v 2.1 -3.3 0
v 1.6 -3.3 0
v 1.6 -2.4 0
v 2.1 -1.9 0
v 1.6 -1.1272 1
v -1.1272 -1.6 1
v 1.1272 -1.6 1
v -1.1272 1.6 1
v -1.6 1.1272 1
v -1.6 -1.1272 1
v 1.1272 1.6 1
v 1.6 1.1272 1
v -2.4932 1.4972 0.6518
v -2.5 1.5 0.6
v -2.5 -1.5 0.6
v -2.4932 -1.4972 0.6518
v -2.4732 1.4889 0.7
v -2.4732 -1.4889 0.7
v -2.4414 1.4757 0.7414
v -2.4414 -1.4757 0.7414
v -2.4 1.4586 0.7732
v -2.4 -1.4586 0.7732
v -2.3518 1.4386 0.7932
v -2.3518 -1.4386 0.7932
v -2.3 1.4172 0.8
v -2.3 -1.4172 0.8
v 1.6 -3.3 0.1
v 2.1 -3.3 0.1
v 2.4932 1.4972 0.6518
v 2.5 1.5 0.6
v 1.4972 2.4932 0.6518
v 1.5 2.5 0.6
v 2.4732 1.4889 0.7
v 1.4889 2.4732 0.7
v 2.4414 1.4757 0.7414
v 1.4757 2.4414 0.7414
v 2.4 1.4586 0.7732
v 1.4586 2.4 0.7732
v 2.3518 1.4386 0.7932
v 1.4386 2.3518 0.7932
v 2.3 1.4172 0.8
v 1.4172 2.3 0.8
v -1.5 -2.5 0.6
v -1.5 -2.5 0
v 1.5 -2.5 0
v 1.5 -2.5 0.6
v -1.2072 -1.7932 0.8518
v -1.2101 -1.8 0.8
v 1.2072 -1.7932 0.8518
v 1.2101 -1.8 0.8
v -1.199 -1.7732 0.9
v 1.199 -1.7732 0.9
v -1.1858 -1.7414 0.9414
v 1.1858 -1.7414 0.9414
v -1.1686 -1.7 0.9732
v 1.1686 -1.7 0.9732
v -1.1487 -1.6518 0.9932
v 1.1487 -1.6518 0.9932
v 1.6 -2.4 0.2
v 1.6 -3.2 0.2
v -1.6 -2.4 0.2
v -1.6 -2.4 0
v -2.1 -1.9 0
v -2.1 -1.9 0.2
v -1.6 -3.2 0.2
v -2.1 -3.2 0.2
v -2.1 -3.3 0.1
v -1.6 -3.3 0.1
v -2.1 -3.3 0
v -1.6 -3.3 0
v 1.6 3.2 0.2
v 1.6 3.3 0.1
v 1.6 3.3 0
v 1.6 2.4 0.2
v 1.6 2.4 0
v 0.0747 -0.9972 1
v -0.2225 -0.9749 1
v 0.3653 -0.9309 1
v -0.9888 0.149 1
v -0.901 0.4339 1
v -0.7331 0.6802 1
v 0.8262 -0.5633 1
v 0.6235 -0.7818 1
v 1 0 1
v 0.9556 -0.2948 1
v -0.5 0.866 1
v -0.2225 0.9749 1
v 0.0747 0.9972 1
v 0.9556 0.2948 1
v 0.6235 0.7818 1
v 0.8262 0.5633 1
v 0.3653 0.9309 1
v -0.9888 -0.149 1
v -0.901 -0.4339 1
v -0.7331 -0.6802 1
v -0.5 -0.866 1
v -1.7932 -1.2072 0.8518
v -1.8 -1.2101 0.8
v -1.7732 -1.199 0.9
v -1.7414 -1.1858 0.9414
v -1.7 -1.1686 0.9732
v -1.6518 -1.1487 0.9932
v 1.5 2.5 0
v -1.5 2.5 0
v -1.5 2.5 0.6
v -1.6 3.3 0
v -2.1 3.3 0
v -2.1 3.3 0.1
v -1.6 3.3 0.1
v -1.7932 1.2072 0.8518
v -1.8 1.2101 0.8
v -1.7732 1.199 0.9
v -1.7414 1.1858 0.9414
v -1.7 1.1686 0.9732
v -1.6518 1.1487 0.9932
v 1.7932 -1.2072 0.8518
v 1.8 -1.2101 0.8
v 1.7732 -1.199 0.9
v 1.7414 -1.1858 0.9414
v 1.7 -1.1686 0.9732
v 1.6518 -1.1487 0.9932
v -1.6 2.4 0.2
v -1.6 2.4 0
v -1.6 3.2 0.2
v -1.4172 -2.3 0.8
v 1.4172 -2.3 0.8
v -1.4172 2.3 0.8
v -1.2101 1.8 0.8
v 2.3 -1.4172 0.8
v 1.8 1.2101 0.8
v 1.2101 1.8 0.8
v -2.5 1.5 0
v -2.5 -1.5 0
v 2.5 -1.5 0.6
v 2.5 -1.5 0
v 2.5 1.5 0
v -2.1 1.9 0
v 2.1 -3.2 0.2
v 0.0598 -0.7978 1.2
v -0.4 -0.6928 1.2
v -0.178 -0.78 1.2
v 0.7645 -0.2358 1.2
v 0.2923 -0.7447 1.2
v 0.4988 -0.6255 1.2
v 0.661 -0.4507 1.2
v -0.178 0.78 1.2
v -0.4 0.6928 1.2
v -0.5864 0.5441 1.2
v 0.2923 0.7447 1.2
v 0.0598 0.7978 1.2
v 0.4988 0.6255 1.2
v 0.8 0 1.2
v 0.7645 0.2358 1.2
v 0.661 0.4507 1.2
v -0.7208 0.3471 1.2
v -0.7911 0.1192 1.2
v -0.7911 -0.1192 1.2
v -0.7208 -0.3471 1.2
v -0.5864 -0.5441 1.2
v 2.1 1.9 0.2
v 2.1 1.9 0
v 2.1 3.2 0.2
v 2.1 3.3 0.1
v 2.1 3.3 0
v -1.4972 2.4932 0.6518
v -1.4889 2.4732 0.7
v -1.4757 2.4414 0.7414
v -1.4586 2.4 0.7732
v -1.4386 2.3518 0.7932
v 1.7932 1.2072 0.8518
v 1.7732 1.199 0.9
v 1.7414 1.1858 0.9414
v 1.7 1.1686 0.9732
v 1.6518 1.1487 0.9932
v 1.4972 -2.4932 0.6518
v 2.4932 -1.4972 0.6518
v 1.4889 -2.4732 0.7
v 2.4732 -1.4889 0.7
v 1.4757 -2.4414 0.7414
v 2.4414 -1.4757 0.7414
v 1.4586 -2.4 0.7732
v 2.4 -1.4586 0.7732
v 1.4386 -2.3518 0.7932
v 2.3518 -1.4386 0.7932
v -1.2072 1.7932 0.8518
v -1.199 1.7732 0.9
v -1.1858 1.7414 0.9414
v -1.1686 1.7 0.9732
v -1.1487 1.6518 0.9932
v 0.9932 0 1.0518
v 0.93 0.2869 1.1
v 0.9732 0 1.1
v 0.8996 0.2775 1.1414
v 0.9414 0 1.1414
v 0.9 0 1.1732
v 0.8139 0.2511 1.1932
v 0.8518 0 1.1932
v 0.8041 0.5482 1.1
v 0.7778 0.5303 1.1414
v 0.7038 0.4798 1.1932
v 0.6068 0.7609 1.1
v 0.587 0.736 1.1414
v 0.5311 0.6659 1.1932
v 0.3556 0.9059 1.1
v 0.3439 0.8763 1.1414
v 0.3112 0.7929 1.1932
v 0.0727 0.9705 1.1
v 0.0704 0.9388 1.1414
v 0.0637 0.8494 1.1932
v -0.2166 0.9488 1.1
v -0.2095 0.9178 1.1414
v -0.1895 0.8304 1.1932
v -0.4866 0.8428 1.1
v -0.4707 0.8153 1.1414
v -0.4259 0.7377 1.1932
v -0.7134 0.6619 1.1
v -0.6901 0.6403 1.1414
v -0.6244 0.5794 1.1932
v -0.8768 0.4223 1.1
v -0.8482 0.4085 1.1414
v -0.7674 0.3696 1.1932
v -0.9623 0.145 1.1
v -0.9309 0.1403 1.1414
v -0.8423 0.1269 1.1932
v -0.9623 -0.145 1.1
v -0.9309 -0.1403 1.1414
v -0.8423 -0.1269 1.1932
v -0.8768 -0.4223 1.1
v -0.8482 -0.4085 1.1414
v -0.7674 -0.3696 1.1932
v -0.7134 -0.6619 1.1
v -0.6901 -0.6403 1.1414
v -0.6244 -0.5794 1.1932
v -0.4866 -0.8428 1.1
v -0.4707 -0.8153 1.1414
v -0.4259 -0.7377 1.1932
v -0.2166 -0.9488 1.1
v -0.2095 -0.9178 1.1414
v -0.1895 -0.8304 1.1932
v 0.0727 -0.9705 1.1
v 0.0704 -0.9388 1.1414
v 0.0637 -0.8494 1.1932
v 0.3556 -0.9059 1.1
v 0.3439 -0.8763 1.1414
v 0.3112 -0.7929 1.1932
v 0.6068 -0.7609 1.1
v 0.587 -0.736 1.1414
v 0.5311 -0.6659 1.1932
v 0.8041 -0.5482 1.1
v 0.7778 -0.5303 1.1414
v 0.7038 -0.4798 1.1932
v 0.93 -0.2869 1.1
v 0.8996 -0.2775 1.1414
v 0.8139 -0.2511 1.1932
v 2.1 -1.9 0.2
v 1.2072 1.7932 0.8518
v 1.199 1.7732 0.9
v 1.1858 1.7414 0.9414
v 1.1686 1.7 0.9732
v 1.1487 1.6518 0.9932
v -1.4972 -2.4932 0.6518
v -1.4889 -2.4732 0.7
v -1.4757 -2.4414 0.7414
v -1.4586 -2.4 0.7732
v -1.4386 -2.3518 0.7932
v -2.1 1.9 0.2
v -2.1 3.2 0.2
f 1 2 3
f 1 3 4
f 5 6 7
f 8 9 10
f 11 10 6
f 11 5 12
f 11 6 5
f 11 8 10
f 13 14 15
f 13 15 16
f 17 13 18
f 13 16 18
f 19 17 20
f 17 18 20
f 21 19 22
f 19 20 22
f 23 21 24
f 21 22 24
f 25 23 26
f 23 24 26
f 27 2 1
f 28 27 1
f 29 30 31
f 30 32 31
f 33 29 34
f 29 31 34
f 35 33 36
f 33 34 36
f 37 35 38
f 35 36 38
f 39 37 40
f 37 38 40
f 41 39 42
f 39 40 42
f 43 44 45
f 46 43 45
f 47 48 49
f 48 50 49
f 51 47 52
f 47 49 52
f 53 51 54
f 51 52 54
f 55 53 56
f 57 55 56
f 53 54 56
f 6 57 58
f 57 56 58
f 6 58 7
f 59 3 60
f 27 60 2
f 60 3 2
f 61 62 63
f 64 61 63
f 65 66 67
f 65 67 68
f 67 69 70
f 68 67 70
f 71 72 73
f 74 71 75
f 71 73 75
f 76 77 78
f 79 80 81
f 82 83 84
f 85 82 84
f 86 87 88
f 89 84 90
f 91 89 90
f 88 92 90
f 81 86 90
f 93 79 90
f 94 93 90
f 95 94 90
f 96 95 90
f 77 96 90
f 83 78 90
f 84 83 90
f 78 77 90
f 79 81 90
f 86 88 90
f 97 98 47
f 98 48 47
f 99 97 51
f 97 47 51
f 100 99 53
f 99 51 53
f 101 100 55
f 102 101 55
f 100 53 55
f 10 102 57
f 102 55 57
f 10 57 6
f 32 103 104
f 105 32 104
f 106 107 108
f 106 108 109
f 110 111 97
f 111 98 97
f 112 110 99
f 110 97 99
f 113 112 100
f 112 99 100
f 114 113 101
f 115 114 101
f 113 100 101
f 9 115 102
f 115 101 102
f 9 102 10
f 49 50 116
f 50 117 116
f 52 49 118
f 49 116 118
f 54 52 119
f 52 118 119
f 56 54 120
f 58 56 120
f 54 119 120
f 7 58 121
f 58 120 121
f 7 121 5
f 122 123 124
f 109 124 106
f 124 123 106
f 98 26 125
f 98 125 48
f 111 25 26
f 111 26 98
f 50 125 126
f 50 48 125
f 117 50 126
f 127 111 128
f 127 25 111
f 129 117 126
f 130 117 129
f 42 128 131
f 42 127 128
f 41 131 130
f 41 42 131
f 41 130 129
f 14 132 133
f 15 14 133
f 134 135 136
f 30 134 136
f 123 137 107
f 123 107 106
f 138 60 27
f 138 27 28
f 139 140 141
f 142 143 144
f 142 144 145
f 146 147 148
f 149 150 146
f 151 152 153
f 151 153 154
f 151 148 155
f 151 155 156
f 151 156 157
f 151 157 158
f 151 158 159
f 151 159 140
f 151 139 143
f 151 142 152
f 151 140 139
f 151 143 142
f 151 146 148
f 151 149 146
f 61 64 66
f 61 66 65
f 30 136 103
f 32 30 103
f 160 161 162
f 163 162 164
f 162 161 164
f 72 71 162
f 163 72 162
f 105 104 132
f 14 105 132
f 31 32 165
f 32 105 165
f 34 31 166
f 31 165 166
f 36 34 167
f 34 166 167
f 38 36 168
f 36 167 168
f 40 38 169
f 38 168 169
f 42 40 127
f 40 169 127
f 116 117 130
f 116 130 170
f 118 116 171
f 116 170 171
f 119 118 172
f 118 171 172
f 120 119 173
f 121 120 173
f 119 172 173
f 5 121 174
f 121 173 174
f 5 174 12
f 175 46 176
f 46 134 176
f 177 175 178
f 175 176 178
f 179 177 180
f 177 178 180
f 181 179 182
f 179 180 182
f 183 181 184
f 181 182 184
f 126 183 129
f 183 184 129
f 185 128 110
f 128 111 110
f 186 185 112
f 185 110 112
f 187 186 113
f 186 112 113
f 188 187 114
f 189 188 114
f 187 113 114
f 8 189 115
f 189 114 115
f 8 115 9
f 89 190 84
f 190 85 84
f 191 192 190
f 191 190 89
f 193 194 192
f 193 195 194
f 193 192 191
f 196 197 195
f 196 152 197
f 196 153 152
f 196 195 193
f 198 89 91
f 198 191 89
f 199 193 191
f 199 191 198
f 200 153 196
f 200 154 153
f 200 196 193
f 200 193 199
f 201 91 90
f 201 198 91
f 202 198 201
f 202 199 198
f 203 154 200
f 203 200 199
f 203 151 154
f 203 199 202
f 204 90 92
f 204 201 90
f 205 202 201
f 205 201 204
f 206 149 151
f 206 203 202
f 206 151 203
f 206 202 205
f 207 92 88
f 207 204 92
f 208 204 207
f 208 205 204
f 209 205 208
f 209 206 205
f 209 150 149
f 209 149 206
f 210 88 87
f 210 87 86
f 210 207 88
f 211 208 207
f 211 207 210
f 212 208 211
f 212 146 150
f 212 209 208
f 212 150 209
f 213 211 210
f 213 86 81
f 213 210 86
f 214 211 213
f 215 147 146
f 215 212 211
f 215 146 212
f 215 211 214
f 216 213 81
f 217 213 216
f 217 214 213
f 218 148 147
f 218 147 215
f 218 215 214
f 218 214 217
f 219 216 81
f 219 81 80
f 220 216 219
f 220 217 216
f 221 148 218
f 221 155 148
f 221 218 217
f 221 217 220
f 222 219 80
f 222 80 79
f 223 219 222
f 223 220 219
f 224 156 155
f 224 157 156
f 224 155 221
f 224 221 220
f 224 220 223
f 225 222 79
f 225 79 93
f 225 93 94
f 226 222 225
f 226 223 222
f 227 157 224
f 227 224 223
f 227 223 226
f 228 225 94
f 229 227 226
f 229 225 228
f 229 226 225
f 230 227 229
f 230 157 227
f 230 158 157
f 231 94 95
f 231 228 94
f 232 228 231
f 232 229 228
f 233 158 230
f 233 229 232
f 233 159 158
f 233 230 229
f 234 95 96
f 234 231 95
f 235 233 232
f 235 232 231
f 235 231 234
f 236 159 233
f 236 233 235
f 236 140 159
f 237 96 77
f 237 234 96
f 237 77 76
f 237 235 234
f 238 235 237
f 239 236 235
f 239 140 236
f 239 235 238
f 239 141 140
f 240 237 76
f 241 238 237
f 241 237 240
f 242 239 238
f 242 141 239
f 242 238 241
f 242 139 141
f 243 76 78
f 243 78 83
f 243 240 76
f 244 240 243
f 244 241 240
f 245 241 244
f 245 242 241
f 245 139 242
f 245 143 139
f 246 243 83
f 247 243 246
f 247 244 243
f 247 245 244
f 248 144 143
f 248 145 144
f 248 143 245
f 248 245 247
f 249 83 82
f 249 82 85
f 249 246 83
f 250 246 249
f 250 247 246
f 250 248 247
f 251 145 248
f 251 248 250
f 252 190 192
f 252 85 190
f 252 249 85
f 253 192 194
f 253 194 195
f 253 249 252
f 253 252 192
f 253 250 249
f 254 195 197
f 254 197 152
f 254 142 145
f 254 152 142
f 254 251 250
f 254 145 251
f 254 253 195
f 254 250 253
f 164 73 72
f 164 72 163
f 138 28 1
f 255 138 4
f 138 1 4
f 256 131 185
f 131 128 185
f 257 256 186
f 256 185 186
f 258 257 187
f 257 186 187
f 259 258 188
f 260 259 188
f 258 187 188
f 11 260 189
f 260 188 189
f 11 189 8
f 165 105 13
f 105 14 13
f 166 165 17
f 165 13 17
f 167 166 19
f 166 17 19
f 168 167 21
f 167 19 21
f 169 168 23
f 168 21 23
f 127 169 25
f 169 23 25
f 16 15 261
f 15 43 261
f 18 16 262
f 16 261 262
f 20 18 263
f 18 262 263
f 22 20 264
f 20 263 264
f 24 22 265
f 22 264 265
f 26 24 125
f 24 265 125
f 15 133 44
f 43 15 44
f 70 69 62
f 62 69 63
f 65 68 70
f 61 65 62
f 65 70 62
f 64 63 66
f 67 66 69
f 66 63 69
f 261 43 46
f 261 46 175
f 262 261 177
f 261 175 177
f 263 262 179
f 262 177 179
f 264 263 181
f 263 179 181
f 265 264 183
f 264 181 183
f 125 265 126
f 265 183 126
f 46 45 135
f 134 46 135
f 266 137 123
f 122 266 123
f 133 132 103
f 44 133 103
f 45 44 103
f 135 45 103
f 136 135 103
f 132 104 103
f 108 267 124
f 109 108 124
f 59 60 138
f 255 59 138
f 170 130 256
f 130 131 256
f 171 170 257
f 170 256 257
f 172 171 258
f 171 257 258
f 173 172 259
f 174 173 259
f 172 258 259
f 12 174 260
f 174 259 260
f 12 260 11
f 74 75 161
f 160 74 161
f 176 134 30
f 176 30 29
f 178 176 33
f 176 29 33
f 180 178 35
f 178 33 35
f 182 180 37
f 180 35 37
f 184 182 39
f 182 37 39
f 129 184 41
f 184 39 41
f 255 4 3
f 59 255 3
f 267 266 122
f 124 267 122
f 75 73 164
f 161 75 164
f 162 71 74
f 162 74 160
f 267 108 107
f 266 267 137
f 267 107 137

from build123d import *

# Parameters (mm, degrees)
F1_DEPTH   = 0.8
F0_W       = 0.5
F0_H       = 0.8
F2_DEPTH   = 0.2
F3_R       = 0.2
F5_DEPTH   = 0.2
F6_R       = 0.19999
F7_R       = 1
F8_DEPTH   = 0.2
F9_R       = 0.19999
F10_SIZE   = 0.1
F10_2_SIZE = 0.1
F10_3_SIZE = 0.1
F10_4_SIZE = 0.1


# Not quite as in the source:
# - a fillet or chamfer is up to 0.001 mm smaller than in the source, because OpenCascade refuses the exact size


with BuildPart() as f1:
    # F0 (on Top) → F1 (new body)
    with BuildSketch(Plane.XY):
        Polygon((-2.1, 1.9), (-2.5, 1.5), (-2.5, -1.5), (-2.1, -1.9), (-1.6, -2.4), (-1.5, -2.5), (1.5, -2.5), (1.6, -2.4), (2.1, -1.9), (2.5, -1.5), (2.5, 1.5), (2.1, 1.9), (1.6, 2.4), (1.5, 2.5), (-1.5, 2.5), (-1.6, 2.4), align=None)
    extrude(amount=F1_DEPTH)

    # F3
    f3_edges = [f1.edges().sort_by_distance(p)[0] for p in [
        (-2, 2, 0.8),
        (-2.5, 0, 0.8),
        (-2, -2, 0.8),
        (0, -2.5, 0.8),
        (2, -2, 0.8),
        (2.5, 0, 0.8),
        (2, 2, 0.8),
        (0, 2.5, 0.8),
    ]]
    fillet(f3_edges, radius=F3_R)

    # F4 (on face) → F5 (join)
    with BuildSketch(Plane.XY.offset(0.8)):
        Polygon((1.2100505063, 1.8), (-1.2100505063, 1.8), (-1.8, 1.2100505063), (-1.8, -1.2100505063), (-1.2100505063, -1.8), (1.2100505063, -1.8), (1.8, -1.2100505063), (1.8, 1.2100505063), align=None)
    extrude(amount=F5_DEPTH)

    # F6 (radius 0.2 in the source; OpenCascade refuses exactly that, so slightly less here)
    f6_edges = [f1.edges().sort_by_distance(p)[0] for p in [
        (1.505025, 1.505025, 1),
        (0, 1.8, 1),
        (-1.505025, 1.505025, 1),
        (-1.8, 0, 1),
        (-1.505025, -1.505025, 1),
        (0, -1.8, 1),
        (1.505025, -1.505025, 1),
        (1.8, 0, 1),
    ]]
    fillet(f6_edges, radius=F6_R)


with BuildPart() as f2:
    # F0 (on Top) → F2 (new body)
    with BuildSketch(Plane.XY):
        Polygon((-1.6, -2.4), (-2.1, -1.9), (-2.1, -2.5), (-1.6, -2.5), align=None)
        with Locations((-1.85, -2.9)):
            Rectangle(F0_W, F0_H)
    extrude(amount=F2_DEPTH)

    # F10#4
    f10_4_edges = [f2.edges().sort_by_distance(p)[0] for p in [
        (-1.85, -3.3, 0.2),
    ]]
    chamfer(f10_4_edges, length=F10_4_SIZE)


with BuildPart() as f2b:
    # F0 (on Top) → F2, piece 2 (new body)
    with BuildSketch(Plane.XY):
        with Locations((-1.85, 2.9)):
            Rectangle(F0_W, F0_H)
        Polygon((-1.6, 2.5), (-2.1, 2.5), (-2.1, 1.9), (-1.6, 2.4), align=None)
    extrude(amount=F2_DEPTH)

    # F10
    f10_edges = [f2b.edges().sort_by_distance(p)[0] for p in [
        (-1.85, 3.3, 0.2),
    ]]
    chamfer(f10_edges, length=F10_SIZE)


with BuildPart() as f2c:
    # F0 (on Top) → F2, piece 3 (new body)
    with BuildSketch(Plane.XY):
        with Locations((1.85, 2.9)):
            Rectangle(F0_W, F0_H)
        Polygon((2.1, 2.5), (1.6, 2.5), (1.6, 2.4), (2.1, 1.9), align=None)
    extrude(amount=F2_DEPTH)

    # F10#2
    f10_2_edges = [f2c.edges().sort_by_distance(p)[0] for p in [
        (1.85, 3.3, 0.2),
    ]]
    chamfer(f10_2_edges, length=F10_2_SIZE)


with BuildPart() as f2d:
    # F0 (on Top) → F2, piece 4 (new body)
    with BuildSketch(Plane.XY):
        Polygon((1.6, -2.4), (1.6, -2.5), (2.1, -2.5), (2.1, -1.9), align=None)
        with Locations((1.85, -2.9)):
            Rectangle(F0_W, F0_H)
    extrude(amount=F2_DEPTH)

    # F10#3
    f10_3_edges = [f2d.edges().sort_by_distance(p)[0] for p in [
        (1.85, -3.3, 0.2),
    ]]
    chamfer(f10_3_edges, length=F10_3_SIZE)


with BuildPart() as f8:
    # F7 (on face) → F8 (new body)
    with BuildSketch(Plane.XY.offset(1)):
        Circle(F7_R)
    extrude(amount=F8_DEPTH)

    # F9 (radius 0.2 in the source; OpenCascade refuses exactly that, so slightly less here)
    f9_edges = [f8.edges().sort_by_distance(p)[0] for p in [
        (-1, 0, 1.2),
    ]]
    fillet(f9_edges, radius=F9_R)


solid = Compound([f1.part, f2.part, f2b.part, f2c.part, f2d.part, f8.part])
